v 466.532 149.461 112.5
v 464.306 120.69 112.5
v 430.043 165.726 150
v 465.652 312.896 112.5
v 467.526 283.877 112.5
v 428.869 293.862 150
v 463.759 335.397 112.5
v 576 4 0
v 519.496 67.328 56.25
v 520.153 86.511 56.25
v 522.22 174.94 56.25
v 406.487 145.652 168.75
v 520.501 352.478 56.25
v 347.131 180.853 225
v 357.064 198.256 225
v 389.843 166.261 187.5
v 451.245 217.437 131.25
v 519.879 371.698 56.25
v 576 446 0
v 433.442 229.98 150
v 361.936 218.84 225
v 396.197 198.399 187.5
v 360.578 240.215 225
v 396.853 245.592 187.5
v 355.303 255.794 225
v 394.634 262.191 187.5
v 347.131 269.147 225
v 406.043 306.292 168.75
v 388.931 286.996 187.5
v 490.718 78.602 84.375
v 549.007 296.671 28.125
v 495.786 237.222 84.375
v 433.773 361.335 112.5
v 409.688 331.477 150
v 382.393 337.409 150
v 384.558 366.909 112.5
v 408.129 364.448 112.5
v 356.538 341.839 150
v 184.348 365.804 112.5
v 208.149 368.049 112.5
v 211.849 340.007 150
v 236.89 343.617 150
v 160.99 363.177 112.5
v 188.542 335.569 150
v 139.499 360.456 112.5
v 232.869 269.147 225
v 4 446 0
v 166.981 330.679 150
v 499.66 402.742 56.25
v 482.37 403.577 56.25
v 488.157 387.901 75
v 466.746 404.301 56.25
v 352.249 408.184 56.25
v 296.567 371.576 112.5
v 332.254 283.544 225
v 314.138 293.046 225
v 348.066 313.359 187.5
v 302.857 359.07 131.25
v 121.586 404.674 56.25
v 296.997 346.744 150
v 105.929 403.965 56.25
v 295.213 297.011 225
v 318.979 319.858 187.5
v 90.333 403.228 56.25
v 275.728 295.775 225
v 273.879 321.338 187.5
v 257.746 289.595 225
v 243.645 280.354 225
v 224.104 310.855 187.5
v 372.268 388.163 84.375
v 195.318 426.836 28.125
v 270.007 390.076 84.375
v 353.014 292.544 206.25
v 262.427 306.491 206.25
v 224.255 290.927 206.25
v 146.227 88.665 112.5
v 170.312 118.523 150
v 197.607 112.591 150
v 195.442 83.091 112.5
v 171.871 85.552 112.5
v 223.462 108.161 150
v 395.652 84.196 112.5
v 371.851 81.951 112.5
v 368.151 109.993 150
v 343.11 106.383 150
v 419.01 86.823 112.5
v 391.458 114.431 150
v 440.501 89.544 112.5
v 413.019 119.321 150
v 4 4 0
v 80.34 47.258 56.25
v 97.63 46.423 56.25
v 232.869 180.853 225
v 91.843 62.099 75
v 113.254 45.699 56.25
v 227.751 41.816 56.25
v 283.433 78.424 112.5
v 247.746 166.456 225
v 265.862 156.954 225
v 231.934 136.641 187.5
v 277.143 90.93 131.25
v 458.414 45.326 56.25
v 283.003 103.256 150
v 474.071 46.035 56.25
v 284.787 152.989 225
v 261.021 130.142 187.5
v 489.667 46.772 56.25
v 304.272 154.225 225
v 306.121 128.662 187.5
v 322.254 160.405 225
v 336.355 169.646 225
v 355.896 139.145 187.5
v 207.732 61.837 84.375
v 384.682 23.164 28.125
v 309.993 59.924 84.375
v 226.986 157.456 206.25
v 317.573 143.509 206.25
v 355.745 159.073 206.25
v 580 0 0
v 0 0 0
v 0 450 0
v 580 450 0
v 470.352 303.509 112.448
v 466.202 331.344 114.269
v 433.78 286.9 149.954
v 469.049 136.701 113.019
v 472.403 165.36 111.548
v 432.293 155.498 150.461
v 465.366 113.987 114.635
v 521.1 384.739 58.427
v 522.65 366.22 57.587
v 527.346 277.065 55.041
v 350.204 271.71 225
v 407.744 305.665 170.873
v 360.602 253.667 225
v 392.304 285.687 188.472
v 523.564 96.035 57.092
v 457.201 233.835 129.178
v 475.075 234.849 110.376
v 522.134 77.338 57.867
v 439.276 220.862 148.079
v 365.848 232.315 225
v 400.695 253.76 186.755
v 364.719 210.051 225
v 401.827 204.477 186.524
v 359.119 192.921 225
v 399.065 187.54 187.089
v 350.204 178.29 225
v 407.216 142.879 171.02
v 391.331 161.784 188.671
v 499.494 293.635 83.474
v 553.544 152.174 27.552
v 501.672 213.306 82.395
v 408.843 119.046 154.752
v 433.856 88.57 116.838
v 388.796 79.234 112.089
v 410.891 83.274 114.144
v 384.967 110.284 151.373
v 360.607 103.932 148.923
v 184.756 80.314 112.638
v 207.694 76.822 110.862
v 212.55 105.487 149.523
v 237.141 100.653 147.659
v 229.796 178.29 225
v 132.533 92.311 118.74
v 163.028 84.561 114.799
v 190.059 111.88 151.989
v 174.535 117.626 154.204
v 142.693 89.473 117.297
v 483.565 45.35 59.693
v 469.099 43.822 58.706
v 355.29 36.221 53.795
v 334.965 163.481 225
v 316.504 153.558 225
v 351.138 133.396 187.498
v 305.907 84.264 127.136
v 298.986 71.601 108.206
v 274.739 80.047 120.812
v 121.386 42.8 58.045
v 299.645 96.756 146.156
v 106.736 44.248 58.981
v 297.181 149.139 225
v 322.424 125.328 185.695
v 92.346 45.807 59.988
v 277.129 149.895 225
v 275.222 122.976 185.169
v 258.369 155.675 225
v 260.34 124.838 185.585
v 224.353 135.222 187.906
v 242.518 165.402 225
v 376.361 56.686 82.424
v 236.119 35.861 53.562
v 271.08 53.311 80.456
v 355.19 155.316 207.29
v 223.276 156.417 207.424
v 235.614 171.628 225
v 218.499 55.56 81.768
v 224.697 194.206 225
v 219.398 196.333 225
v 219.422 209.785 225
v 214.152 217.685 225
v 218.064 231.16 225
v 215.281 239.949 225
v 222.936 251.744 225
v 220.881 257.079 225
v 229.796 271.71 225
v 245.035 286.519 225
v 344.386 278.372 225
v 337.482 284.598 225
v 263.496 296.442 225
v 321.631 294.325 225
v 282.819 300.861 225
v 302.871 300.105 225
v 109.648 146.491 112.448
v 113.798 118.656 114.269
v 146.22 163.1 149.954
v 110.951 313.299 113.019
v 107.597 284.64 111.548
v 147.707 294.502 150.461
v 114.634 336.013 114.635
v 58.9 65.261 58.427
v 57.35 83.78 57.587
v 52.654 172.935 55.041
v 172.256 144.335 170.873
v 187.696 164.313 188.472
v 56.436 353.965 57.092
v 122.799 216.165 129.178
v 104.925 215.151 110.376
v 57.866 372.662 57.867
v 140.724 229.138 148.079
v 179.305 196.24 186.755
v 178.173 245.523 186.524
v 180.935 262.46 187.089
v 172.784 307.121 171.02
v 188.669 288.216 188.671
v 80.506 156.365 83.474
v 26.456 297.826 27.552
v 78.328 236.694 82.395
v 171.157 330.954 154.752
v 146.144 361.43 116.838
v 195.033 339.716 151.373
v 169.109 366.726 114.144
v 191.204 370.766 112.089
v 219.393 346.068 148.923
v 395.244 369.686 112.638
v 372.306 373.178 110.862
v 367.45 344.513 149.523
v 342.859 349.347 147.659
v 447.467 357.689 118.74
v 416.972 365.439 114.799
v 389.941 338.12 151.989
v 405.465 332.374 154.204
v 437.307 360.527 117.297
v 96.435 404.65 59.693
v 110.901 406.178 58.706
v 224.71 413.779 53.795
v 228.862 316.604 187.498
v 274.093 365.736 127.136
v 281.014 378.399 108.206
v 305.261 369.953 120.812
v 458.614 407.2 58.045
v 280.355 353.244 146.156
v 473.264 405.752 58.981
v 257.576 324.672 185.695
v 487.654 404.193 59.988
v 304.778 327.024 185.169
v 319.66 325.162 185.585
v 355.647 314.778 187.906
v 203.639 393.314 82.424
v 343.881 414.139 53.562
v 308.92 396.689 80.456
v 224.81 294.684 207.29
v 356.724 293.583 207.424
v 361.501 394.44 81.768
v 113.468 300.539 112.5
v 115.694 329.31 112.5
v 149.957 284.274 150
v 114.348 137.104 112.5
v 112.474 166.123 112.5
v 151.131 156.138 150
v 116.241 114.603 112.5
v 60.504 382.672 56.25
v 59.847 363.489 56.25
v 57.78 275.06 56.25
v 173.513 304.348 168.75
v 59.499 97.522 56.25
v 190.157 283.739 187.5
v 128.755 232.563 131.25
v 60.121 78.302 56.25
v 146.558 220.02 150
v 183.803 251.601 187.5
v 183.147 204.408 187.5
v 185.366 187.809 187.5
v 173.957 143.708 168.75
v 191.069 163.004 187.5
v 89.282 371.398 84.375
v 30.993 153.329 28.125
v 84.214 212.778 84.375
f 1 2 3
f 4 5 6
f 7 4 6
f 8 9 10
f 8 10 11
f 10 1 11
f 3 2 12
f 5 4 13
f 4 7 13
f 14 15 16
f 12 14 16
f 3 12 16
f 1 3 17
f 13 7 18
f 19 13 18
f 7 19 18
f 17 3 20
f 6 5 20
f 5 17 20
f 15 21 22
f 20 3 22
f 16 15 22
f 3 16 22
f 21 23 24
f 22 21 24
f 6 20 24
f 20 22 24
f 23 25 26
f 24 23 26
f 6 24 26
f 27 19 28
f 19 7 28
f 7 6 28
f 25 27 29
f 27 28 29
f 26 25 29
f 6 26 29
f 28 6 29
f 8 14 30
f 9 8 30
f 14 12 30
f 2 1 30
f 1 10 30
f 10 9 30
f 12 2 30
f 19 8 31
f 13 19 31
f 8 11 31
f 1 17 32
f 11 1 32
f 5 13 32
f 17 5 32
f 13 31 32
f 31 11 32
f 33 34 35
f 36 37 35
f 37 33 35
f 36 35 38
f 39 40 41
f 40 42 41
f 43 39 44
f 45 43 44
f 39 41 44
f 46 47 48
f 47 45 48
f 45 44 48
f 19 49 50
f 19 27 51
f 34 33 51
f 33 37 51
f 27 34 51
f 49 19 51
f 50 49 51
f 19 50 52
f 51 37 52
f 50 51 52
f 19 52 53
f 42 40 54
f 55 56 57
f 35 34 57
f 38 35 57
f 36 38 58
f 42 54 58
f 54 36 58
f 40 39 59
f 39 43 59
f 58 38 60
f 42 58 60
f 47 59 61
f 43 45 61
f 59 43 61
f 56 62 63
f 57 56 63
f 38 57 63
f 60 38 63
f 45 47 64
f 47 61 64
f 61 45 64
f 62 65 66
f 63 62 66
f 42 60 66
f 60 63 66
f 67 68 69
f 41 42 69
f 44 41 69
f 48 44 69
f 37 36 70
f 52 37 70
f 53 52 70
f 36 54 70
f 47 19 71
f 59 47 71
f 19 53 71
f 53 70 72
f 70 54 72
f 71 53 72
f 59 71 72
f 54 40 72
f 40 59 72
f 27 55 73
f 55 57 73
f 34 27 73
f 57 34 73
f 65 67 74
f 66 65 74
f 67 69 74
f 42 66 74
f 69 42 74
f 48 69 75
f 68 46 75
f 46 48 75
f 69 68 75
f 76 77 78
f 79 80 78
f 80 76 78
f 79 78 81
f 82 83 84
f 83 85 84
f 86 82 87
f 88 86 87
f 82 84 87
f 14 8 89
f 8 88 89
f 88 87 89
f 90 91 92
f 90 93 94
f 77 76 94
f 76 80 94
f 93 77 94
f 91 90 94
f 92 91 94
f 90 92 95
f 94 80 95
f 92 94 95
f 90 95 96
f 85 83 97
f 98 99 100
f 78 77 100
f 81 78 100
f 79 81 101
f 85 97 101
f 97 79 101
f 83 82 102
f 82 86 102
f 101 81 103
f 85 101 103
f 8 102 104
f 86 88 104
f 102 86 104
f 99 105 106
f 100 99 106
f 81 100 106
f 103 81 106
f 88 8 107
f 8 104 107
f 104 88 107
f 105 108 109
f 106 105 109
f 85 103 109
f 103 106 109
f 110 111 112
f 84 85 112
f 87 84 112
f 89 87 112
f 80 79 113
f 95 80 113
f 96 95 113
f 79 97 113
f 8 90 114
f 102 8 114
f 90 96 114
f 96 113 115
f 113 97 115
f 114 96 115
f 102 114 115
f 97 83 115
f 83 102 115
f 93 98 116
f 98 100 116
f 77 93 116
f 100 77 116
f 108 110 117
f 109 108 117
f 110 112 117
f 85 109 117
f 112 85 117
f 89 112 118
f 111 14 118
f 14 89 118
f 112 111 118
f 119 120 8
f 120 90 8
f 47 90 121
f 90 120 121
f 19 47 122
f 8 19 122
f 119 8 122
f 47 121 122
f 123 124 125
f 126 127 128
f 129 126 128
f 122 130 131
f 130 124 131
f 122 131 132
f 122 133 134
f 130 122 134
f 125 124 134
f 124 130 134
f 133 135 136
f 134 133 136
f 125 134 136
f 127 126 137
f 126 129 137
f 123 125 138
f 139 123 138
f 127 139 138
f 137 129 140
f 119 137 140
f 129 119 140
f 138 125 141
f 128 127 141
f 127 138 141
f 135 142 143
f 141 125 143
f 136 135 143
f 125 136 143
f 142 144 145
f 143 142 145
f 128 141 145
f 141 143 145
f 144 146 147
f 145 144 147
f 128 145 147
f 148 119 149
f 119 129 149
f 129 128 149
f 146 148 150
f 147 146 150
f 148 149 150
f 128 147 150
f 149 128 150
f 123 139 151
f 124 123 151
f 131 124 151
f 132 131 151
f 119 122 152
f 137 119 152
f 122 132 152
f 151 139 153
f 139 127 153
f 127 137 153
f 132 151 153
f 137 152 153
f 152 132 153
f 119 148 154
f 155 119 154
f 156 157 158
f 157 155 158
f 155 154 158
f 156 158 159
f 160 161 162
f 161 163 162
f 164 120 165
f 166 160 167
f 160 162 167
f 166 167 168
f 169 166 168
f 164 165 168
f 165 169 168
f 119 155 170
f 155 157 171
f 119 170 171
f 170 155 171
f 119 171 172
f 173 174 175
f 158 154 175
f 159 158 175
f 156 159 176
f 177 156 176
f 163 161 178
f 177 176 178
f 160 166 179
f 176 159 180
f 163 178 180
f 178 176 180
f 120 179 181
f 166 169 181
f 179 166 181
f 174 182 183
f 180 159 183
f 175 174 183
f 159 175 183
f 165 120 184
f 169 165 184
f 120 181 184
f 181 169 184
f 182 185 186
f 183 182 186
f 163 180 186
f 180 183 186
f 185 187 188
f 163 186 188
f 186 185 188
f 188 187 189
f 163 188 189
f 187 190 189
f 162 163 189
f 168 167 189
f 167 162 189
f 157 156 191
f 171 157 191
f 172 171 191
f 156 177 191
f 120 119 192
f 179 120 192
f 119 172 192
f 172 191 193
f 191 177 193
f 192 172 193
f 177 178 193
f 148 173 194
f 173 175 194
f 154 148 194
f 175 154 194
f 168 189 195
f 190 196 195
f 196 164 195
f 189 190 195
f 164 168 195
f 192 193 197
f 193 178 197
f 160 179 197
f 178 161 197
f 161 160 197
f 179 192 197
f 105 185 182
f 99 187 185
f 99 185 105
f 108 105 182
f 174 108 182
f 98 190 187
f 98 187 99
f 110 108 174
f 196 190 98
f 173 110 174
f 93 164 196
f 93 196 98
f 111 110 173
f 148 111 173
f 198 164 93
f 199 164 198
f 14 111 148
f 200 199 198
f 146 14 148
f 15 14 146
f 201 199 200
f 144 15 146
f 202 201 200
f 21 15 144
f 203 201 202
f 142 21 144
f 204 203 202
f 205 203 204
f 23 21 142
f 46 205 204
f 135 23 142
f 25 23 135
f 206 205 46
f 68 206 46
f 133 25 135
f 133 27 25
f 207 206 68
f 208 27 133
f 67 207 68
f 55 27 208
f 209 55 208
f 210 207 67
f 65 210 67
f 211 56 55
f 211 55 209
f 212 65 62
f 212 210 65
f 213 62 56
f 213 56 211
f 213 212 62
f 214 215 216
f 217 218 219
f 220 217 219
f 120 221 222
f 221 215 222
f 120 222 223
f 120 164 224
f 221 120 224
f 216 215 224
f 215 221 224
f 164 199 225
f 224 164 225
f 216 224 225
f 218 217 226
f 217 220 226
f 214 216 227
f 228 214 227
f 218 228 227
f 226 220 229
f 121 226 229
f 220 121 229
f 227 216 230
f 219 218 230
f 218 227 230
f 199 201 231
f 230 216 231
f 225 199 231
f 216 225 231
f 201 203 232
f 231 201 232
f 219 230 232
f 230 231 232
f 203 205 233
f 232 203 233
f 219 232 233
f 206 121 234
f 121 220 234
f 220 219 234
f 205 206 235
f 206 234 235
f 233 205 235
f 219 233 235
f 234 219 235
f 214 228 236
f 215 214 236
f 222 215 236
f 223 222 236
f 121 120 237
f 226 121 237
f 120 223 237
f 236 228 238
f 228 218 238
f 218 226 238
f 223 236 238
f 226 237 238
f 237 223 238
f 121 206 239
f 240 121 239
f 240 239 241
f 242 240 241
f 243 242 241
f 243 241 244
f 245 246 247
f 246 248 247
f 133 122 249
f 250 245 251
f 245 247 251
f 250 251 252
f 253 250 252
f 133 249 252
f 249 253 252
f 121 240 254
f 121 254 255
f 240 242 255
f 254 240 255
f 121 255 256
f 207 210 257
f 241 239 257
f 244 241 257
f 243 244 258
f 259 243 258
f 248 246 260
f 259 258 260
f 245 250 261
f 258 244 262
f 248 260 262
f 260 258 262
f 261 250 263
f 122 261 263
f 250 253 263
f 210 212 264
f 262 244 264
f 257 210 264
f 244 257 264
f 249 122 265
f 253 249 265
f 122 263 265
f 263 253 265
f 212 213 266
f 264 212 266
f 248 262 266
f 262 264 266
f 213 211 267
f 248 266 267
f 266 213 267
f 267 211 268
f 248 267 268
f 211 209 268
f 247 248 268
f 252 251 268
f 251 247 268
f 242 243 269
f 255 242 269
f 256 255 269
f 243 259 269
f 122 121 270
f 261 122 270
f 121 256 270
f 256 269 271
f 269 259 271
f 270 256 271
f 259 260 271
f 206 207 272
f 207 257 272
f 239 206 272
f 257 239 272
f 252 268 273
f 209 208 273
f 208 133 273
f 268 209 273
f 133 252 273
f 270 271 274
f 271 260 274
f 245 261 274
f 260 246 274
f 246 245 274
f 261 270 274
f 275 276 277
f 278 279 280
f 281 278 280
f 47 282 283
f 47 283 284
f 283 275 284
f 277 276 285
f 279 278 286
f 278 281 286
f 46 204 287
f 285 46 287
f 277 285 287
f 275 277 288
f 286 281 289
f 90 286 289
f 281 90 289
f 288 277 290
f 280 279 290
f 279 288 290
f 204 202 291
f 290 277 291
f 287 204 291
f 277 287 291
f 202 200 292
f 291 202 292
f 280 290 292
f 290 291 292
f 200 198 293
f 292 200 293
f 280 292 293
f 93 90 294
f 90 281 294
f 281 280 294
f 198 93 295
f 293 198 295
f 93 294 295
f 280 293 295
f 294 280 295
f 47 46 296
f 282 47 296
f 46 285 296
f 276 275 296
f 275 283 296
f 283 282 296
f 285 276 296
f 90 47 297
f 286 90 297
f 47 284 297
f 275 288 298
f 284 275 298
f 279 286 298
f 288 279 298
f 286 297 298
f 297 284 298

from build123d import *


with BuildPart() as part:
    # Sketch1 → Loft1 section 0
    with BuildSketch(Plane.XY):
        with BuildLine():
            Line((0, 0), (0, 450))
            Line((0, 450), (580, 450))
            Line((580, 450), (580, 0))
            Line((580, 0), (0, 0))
        make_face()
    # Sketch2 for Loft1 → Loft1 section 1
    with BuildSketch(Plane.XY.offset(225)):
        with BuildLine():
            # circular arc as an exact rational Bezier (weights 1, cos(half-angle), 1)
            Bezier((229.795511203, 178.289620761), (193.554699724, 225), (229.795511203, 271.710379239), weights=[1, 0.790085155, 1])
            Bezier((229.795511203, 271.710379239), (290, 349.307275912), (350.204488797, 271.710379239), weights=[1, 0.612997103, 1])
            Bezier((350.204488797, 271.710379239), (386.445300276, 225), (350.204488797, 178.289620761), weights=[1, 0.790085155, 1])
            Bezier((350.204488797, 178.289620761), (290, 100.692724088), (229.795511203, 178.289620761), weights=[1, 0.612997103, 1])
        make_face()
    loft()

    # Cut-Loft2: read off the stored shape, not the designer's step
    # Cut-Loft2: loft between two sections, ruled curve by curve
    cut_loft2_from = [
        Edge.make_bspline([(576, 446, 0), (564.083333333, 446, 0), (552.166666667, 446, 0), (528.333333333, 446, 0), (516.416666667, 446, 0), (492.583333333, 446, 0), (480.666666667, 446, 0), (456.833333333, 446, 0), (444.916666667, 446, 0), (421.083333333, 446, 0), (409.166666667, 446, 0), (385.333333333, 446, 0), (373.416666667, 446, 0), (349.583333333, 446, 0), (337.666666667, 446, 0), (313.833333333, 446, 0), (301.916666667, 446, 0), (278.083333333, 446, 0), (266.166666667, 446, 0), (242.333333333, 446, 0), (230.416666667, 446, 0), (206.583333333, 446, 0), (194.666666667, 446, 0), (170.833333333, 446, 0), (158.916666667, 446, 0), (135.083333333, 446, 0), (123.166666667, 446, 0), (99.333333333, 446, 0), (87.416666667, 446, 0), (63.583333333, 446, 0), (51.666666667, 446, 0), (27.833333333, 446, 0), (15.916666667, 446, 0), (4, 446, 0)], [0, 0, 0, 0, 0.0625, 0.0625, 0.125, 0.125, 0.1875, 0.1875, 0.25, 0.25, 0.3125, 0.3125, 0.375, 0.375, 0.4375, 0.4375, 0.5, 0.5, 0.5625, 0.5625, 0.625, 0.625, 0.6875, 0.6875, 0.75, 0.75, 0.8125, 0.8125, 0.875, 0.875, 0.9375, 0.9375, 1, 1, 1, 1], 3),
        Edge.make_bspline([(4, 446, 0), (4, 427.583333333, 0), (4, 409.166666667, 0), (4, 372.333333333, 0), (4, 353.916666667, 0), (4, 317.083333333, 0), (4, 298.666666667, 0), (4, 261.833333333, 0), (4, 243.416666667, 0), (4, 206.583333333, 0), (4, 188.166666667, 0), (4, 151.333333333, 0), (4, 132.916666667, 0), (4, 96.083333333, 0), (4, 77.666666667, 0), (4, 40.833333333, 0), (4, 22.416666667, 0), (4, 4, 0)], [0, 0, 0, 0, 0.125, 0.125, 0.25, 0.25, 0.375, 0.375, 0.5, 0.5, 0.625, 0.625, 0.75, 0.75, 0.875, 0.875, 1, 1, 1, 1], 3),
        Edge.make_bspline([(576, 4, 0), (576, 22.416666667, 0), (576, 40.833333333, 0), (576, 77.666666667, 0), (576, 96.083333333, 0), (576, 132.916666667, 0), (576, 151.333333333, 0), (576, 188.166666667, 0), (576, 206.583333333, 0), (576, 243.416666667, 0), (576, 261.833333333, 0), (576, 298.666666667, 0), (576, 317.083333333, 0), (576, 353.916666667, 0), (576, 372.333333333, 0), (576, 409.166666667, 0), (576, 427.583333333, 0), (576, 446, 0)], [0, 0, 0, 0, 0.125, 0.125, 0.25, 0.25, 0.375, 0.375, 0.5, 0.5, 0.625, 0.625, 0.75, 0.75, 0.875, 0.875, 1, 1, 1, 1], 3),
        Edge.make_bspline([(4, 4, 0), (15.916666667, 4, 0), (27.833333333, 4, 0), (51.666666667, 4, 0), (63.583333333, 4, 0), (87.416666667, 4, 0), (99.333333333, 4, 0), (123.166666667, 4, 0), (135.083333333, 4, 0), (158.916666667, 4, 0), (170.833333333, 4, 0), (194.666666667, 4, 0), (206.583333333, 4, 0), (230.416666667, 4, 0), (242.333333333, 4, 0), (266.166666667, 4, 0), (278.083333333, 4, 0), (301.916666667, 4, 0), (313.833333333, 4, 0), (337.666666667, 4, 0), (349.583333333, 4, 0), (373.416666667, 4, 0), (385.333333333, 4, 0), (409.166666667, 4, 0), (421.083333333, 4, 0), (444.916666667, 4, 0), (456.833333333, 4, 0), (480.666666667, 4, 0), (492.583333333, 4, 0), (516.416666667, 4, 0), (528.333333333, 4, 0), (552.166666667, 4, 0), (564.083333333, 4, 0), (576, 4, 0)], [0, 0, 0, 0, 0.0625, 0.0625, 0.125, 0.125, 0.1875, 0.1875, 0.25, 0.25, 0.3125, 0.3125, 0.375, 0.375, 0.4375, 0.4375, 0.5, 0.5, 0.5625, 0.5625, 0.625, 0.625, 0.6875, 0.6875, 0.75, 0.75, 0.8125, 0.8125, 0.875, 0.875, 0.9375, 0.9375, 1, 1, 1, 1], 3),
    ]
    cut_loft2_to = [
        Edge.make_bspline([(347.130777101, 269.146509578, 225), (345.67525748, 271.030123204, 225), (344.090894703, 272.887735344, 225), (340.657527063, 276.506067972, 225), (338.808446099, 278.266722873, 225), (334.848141695, 281.6414368, 225), (332.736859461, 283.255398207, 225), (328.266345603, 286.284723799, 225), (325.90708719, 287.699963514, 225), (320.967848708, 290.280905949, 225), (318.387886703, 291.446469996, 225), (313.047680491, 293.48218681, 225), (310.287505998, 294.352205924, 225), (304.639227705, 295.760189219, 225), (301.751242441, 296.298047084, 225), (295.908763417, 297.017982003, 225), (292.95442333, 297.2, 225), (287.04557667, 297.2, 225), (284.091236583, 297.017982003, 225), (278.248757559, 296.298047084, 225), (275.360772295, 295.760189219, 225), (269.712494002, 294.352205924, 225), (266.952319509, 293.48218681, 225), (261.612113297, 291.446469996, 225), (259.032151292, 290.280905949, 225), (254.09291281, 287.699963514, 225), (251.733654397, 286.284723799, 225), (247.263140539, 283.255398207, 225), (245.151858305, 281.6414368, 225), (241.191553901, 278.266722873, 225), (239.342472937, 276.506067972, 225), (235.909105297, 272.887735344, 225), (234.32474252, 271.030123204, 225), (232.869222899, 269.146509578, 225)], [0, 0, 0, 0, 0.0625, 0.0625, 0.125, 0.125, 0.1875, 0.1875, 0.25, 0.25, 0.3125, 0.3125, 0.375, 0.375, 0.4375, 0.4375, 0.5, 0.5, 0.5625, 0.5625, 0.625, 0.625, 0.6875, 0.6875, 0.75, 0.75, 0.8125, 0.8125, 0.875, 0.875, 0.9375, 0.9375, 1, 1, 1, 1], 3),
        Edge.make_bspline([(232.869222899, 269.146509578, 225), (230.619783486, 266.235470337, 225), (228.53431882, 263.074533519, 225), (224.829593326, 256.31322659, 225), (223.211042232, 252.712908785, 225), (220.563364718, 245.182266319, 225), (219.534906142, 241.252361475, 225), (218.153019223, 233.214624715, 225), (217.8, 229.107527049, 225), (217.8, 220.892472951, 225), (218.153019223, 216.785375285, 225), (219.534906142, 208.747638525, 225), (220.563364718, 204.817733681, 225), (223.211042232, 197.287091215, 225), (224.829593326, 193.68677341, 225), (228.53431882, 186.925466481, 225), (230.619783486, 183.764529663, 225), (232.869222899, 180.853490422, 225)], [0, 0, 0, 0, 0.125, 0.125, 0.25, 0.25, 0.375, 0.375, 0.5, 0.5, 0.625, 0.625, 0.75, 0.75, 0.875, 0.875, 1, 1, 1, 1], 3),
        Edge.make_bspline([(347.130777101, 180.853490422, 225), (349.380216514, 183.764529663, 225), (351.46568118, 186.925466481, 225), (355.170406674, 193.68677341, 225), (356.788957768, 197.287091215, 225), (359.436635282, 204.817733681, 225), (360.465093858, 208.747638525, 225), (361.846980777, 216.785375285, 225), (362.2, 220.892472951, 225), (362.2, 229.107527049, 225), (361.846980777, 233.214624715, 225), (360.465093858, 241.252361475, 225), (359.436635282, 245.182266319, 225), (356.788957768, 252.712908785, 225), (355.170406674, 256.31322659, 225), (351.46568118, 263.074533519, 225), (349.380216514, 266.235470337, 225), (347.130777101, 269.146509578, 225)], [0, 0, 0, 0, 0.125, 0.125, 0.25, 0.25, 0.375, 0.375, 0.5, 0.5, 0.625, 0.625, 0.75, 0.75, 0.875, 0.875, 1, 1, 1, 1], 3),
        Edge.make_bspline([(232.869222899, 180.853490422, 225), (234.32474252, 178.969876796, 225), (235.909105297, 177.112264656, 225), (239.342472937, 173.493932028, 225), (241.191553901, 171.733277127, 225), (245.151858305, 168.3585632, 225), (247.263140539, 166.744601793, 225), (251.733654397, 163.715276201, 225), (254.09291281, 162.300036486, 225), (259.032151292, 159.719094051, 225), (261.612113297, 158.553530004, 225), (266.952319509, 156.51781319, 225), (269.712494002, 155.647794076, 225), (275.360772295, 154.239810781, 225), (278.248757559, 153.701952916, 225), (284.091236583, 152.982017997, 225), (287.04557667, 152.8, 225), (292.95442333, 152.8, 225), (295.908763417, 152.982017997, 225), (301.751242441, 153.701952916, 225), (304.639227705, 154.239810781, 225), (310.287505998, 155.647794076, 225), (313.047680491, 156.51781319, 225), (318.387886703, 158.553530004, 225), (320.967848708, 159.719094051, 225), (325.90708719, 162.300036486, 225), (328.266345603, 163.715276201, 225), (332.736859461, 166.744601793, 225), (334.848141695, 168.3585632, 225), (338.808446099, 171.733277127, 225), (340.657527063, 173.493932028, 225), (344.090894703, 177.112264656, 225), (345.67525748, 178.969876796, 225), (347.130777101, 180.853490422, 225)], [0, 0, 0, 0, 0.0625, 0.0625, 0.125, 0.125, 0.1875, 0.1875, 0.25, 0.25, 0.3125, 0.3125, 0.375, 0.375, 0.4375, 0.4375, 0.5, 0.5, 0.5625, 0.5625, 0.625, 0.625, 0.6875, 0.6875, 0.75, 0.75, 0.8125, 0.8125, 0.875, 0.875, 0.9375, 0.9375, 1, 1, 1, 1], 3),
    ]
    cut_loft2 = Solid(Shell([*[Face.make_surface_from_curves(cut_loft2_from[k], cut_loft2_to[k]) for k in range(4)], Face(Wire(cut_loft2_from)), Face(Wire(cut_loft2_to))]))
    add(cut_loft2, mode=Mode.SUBTRACT)


solid = part.part
